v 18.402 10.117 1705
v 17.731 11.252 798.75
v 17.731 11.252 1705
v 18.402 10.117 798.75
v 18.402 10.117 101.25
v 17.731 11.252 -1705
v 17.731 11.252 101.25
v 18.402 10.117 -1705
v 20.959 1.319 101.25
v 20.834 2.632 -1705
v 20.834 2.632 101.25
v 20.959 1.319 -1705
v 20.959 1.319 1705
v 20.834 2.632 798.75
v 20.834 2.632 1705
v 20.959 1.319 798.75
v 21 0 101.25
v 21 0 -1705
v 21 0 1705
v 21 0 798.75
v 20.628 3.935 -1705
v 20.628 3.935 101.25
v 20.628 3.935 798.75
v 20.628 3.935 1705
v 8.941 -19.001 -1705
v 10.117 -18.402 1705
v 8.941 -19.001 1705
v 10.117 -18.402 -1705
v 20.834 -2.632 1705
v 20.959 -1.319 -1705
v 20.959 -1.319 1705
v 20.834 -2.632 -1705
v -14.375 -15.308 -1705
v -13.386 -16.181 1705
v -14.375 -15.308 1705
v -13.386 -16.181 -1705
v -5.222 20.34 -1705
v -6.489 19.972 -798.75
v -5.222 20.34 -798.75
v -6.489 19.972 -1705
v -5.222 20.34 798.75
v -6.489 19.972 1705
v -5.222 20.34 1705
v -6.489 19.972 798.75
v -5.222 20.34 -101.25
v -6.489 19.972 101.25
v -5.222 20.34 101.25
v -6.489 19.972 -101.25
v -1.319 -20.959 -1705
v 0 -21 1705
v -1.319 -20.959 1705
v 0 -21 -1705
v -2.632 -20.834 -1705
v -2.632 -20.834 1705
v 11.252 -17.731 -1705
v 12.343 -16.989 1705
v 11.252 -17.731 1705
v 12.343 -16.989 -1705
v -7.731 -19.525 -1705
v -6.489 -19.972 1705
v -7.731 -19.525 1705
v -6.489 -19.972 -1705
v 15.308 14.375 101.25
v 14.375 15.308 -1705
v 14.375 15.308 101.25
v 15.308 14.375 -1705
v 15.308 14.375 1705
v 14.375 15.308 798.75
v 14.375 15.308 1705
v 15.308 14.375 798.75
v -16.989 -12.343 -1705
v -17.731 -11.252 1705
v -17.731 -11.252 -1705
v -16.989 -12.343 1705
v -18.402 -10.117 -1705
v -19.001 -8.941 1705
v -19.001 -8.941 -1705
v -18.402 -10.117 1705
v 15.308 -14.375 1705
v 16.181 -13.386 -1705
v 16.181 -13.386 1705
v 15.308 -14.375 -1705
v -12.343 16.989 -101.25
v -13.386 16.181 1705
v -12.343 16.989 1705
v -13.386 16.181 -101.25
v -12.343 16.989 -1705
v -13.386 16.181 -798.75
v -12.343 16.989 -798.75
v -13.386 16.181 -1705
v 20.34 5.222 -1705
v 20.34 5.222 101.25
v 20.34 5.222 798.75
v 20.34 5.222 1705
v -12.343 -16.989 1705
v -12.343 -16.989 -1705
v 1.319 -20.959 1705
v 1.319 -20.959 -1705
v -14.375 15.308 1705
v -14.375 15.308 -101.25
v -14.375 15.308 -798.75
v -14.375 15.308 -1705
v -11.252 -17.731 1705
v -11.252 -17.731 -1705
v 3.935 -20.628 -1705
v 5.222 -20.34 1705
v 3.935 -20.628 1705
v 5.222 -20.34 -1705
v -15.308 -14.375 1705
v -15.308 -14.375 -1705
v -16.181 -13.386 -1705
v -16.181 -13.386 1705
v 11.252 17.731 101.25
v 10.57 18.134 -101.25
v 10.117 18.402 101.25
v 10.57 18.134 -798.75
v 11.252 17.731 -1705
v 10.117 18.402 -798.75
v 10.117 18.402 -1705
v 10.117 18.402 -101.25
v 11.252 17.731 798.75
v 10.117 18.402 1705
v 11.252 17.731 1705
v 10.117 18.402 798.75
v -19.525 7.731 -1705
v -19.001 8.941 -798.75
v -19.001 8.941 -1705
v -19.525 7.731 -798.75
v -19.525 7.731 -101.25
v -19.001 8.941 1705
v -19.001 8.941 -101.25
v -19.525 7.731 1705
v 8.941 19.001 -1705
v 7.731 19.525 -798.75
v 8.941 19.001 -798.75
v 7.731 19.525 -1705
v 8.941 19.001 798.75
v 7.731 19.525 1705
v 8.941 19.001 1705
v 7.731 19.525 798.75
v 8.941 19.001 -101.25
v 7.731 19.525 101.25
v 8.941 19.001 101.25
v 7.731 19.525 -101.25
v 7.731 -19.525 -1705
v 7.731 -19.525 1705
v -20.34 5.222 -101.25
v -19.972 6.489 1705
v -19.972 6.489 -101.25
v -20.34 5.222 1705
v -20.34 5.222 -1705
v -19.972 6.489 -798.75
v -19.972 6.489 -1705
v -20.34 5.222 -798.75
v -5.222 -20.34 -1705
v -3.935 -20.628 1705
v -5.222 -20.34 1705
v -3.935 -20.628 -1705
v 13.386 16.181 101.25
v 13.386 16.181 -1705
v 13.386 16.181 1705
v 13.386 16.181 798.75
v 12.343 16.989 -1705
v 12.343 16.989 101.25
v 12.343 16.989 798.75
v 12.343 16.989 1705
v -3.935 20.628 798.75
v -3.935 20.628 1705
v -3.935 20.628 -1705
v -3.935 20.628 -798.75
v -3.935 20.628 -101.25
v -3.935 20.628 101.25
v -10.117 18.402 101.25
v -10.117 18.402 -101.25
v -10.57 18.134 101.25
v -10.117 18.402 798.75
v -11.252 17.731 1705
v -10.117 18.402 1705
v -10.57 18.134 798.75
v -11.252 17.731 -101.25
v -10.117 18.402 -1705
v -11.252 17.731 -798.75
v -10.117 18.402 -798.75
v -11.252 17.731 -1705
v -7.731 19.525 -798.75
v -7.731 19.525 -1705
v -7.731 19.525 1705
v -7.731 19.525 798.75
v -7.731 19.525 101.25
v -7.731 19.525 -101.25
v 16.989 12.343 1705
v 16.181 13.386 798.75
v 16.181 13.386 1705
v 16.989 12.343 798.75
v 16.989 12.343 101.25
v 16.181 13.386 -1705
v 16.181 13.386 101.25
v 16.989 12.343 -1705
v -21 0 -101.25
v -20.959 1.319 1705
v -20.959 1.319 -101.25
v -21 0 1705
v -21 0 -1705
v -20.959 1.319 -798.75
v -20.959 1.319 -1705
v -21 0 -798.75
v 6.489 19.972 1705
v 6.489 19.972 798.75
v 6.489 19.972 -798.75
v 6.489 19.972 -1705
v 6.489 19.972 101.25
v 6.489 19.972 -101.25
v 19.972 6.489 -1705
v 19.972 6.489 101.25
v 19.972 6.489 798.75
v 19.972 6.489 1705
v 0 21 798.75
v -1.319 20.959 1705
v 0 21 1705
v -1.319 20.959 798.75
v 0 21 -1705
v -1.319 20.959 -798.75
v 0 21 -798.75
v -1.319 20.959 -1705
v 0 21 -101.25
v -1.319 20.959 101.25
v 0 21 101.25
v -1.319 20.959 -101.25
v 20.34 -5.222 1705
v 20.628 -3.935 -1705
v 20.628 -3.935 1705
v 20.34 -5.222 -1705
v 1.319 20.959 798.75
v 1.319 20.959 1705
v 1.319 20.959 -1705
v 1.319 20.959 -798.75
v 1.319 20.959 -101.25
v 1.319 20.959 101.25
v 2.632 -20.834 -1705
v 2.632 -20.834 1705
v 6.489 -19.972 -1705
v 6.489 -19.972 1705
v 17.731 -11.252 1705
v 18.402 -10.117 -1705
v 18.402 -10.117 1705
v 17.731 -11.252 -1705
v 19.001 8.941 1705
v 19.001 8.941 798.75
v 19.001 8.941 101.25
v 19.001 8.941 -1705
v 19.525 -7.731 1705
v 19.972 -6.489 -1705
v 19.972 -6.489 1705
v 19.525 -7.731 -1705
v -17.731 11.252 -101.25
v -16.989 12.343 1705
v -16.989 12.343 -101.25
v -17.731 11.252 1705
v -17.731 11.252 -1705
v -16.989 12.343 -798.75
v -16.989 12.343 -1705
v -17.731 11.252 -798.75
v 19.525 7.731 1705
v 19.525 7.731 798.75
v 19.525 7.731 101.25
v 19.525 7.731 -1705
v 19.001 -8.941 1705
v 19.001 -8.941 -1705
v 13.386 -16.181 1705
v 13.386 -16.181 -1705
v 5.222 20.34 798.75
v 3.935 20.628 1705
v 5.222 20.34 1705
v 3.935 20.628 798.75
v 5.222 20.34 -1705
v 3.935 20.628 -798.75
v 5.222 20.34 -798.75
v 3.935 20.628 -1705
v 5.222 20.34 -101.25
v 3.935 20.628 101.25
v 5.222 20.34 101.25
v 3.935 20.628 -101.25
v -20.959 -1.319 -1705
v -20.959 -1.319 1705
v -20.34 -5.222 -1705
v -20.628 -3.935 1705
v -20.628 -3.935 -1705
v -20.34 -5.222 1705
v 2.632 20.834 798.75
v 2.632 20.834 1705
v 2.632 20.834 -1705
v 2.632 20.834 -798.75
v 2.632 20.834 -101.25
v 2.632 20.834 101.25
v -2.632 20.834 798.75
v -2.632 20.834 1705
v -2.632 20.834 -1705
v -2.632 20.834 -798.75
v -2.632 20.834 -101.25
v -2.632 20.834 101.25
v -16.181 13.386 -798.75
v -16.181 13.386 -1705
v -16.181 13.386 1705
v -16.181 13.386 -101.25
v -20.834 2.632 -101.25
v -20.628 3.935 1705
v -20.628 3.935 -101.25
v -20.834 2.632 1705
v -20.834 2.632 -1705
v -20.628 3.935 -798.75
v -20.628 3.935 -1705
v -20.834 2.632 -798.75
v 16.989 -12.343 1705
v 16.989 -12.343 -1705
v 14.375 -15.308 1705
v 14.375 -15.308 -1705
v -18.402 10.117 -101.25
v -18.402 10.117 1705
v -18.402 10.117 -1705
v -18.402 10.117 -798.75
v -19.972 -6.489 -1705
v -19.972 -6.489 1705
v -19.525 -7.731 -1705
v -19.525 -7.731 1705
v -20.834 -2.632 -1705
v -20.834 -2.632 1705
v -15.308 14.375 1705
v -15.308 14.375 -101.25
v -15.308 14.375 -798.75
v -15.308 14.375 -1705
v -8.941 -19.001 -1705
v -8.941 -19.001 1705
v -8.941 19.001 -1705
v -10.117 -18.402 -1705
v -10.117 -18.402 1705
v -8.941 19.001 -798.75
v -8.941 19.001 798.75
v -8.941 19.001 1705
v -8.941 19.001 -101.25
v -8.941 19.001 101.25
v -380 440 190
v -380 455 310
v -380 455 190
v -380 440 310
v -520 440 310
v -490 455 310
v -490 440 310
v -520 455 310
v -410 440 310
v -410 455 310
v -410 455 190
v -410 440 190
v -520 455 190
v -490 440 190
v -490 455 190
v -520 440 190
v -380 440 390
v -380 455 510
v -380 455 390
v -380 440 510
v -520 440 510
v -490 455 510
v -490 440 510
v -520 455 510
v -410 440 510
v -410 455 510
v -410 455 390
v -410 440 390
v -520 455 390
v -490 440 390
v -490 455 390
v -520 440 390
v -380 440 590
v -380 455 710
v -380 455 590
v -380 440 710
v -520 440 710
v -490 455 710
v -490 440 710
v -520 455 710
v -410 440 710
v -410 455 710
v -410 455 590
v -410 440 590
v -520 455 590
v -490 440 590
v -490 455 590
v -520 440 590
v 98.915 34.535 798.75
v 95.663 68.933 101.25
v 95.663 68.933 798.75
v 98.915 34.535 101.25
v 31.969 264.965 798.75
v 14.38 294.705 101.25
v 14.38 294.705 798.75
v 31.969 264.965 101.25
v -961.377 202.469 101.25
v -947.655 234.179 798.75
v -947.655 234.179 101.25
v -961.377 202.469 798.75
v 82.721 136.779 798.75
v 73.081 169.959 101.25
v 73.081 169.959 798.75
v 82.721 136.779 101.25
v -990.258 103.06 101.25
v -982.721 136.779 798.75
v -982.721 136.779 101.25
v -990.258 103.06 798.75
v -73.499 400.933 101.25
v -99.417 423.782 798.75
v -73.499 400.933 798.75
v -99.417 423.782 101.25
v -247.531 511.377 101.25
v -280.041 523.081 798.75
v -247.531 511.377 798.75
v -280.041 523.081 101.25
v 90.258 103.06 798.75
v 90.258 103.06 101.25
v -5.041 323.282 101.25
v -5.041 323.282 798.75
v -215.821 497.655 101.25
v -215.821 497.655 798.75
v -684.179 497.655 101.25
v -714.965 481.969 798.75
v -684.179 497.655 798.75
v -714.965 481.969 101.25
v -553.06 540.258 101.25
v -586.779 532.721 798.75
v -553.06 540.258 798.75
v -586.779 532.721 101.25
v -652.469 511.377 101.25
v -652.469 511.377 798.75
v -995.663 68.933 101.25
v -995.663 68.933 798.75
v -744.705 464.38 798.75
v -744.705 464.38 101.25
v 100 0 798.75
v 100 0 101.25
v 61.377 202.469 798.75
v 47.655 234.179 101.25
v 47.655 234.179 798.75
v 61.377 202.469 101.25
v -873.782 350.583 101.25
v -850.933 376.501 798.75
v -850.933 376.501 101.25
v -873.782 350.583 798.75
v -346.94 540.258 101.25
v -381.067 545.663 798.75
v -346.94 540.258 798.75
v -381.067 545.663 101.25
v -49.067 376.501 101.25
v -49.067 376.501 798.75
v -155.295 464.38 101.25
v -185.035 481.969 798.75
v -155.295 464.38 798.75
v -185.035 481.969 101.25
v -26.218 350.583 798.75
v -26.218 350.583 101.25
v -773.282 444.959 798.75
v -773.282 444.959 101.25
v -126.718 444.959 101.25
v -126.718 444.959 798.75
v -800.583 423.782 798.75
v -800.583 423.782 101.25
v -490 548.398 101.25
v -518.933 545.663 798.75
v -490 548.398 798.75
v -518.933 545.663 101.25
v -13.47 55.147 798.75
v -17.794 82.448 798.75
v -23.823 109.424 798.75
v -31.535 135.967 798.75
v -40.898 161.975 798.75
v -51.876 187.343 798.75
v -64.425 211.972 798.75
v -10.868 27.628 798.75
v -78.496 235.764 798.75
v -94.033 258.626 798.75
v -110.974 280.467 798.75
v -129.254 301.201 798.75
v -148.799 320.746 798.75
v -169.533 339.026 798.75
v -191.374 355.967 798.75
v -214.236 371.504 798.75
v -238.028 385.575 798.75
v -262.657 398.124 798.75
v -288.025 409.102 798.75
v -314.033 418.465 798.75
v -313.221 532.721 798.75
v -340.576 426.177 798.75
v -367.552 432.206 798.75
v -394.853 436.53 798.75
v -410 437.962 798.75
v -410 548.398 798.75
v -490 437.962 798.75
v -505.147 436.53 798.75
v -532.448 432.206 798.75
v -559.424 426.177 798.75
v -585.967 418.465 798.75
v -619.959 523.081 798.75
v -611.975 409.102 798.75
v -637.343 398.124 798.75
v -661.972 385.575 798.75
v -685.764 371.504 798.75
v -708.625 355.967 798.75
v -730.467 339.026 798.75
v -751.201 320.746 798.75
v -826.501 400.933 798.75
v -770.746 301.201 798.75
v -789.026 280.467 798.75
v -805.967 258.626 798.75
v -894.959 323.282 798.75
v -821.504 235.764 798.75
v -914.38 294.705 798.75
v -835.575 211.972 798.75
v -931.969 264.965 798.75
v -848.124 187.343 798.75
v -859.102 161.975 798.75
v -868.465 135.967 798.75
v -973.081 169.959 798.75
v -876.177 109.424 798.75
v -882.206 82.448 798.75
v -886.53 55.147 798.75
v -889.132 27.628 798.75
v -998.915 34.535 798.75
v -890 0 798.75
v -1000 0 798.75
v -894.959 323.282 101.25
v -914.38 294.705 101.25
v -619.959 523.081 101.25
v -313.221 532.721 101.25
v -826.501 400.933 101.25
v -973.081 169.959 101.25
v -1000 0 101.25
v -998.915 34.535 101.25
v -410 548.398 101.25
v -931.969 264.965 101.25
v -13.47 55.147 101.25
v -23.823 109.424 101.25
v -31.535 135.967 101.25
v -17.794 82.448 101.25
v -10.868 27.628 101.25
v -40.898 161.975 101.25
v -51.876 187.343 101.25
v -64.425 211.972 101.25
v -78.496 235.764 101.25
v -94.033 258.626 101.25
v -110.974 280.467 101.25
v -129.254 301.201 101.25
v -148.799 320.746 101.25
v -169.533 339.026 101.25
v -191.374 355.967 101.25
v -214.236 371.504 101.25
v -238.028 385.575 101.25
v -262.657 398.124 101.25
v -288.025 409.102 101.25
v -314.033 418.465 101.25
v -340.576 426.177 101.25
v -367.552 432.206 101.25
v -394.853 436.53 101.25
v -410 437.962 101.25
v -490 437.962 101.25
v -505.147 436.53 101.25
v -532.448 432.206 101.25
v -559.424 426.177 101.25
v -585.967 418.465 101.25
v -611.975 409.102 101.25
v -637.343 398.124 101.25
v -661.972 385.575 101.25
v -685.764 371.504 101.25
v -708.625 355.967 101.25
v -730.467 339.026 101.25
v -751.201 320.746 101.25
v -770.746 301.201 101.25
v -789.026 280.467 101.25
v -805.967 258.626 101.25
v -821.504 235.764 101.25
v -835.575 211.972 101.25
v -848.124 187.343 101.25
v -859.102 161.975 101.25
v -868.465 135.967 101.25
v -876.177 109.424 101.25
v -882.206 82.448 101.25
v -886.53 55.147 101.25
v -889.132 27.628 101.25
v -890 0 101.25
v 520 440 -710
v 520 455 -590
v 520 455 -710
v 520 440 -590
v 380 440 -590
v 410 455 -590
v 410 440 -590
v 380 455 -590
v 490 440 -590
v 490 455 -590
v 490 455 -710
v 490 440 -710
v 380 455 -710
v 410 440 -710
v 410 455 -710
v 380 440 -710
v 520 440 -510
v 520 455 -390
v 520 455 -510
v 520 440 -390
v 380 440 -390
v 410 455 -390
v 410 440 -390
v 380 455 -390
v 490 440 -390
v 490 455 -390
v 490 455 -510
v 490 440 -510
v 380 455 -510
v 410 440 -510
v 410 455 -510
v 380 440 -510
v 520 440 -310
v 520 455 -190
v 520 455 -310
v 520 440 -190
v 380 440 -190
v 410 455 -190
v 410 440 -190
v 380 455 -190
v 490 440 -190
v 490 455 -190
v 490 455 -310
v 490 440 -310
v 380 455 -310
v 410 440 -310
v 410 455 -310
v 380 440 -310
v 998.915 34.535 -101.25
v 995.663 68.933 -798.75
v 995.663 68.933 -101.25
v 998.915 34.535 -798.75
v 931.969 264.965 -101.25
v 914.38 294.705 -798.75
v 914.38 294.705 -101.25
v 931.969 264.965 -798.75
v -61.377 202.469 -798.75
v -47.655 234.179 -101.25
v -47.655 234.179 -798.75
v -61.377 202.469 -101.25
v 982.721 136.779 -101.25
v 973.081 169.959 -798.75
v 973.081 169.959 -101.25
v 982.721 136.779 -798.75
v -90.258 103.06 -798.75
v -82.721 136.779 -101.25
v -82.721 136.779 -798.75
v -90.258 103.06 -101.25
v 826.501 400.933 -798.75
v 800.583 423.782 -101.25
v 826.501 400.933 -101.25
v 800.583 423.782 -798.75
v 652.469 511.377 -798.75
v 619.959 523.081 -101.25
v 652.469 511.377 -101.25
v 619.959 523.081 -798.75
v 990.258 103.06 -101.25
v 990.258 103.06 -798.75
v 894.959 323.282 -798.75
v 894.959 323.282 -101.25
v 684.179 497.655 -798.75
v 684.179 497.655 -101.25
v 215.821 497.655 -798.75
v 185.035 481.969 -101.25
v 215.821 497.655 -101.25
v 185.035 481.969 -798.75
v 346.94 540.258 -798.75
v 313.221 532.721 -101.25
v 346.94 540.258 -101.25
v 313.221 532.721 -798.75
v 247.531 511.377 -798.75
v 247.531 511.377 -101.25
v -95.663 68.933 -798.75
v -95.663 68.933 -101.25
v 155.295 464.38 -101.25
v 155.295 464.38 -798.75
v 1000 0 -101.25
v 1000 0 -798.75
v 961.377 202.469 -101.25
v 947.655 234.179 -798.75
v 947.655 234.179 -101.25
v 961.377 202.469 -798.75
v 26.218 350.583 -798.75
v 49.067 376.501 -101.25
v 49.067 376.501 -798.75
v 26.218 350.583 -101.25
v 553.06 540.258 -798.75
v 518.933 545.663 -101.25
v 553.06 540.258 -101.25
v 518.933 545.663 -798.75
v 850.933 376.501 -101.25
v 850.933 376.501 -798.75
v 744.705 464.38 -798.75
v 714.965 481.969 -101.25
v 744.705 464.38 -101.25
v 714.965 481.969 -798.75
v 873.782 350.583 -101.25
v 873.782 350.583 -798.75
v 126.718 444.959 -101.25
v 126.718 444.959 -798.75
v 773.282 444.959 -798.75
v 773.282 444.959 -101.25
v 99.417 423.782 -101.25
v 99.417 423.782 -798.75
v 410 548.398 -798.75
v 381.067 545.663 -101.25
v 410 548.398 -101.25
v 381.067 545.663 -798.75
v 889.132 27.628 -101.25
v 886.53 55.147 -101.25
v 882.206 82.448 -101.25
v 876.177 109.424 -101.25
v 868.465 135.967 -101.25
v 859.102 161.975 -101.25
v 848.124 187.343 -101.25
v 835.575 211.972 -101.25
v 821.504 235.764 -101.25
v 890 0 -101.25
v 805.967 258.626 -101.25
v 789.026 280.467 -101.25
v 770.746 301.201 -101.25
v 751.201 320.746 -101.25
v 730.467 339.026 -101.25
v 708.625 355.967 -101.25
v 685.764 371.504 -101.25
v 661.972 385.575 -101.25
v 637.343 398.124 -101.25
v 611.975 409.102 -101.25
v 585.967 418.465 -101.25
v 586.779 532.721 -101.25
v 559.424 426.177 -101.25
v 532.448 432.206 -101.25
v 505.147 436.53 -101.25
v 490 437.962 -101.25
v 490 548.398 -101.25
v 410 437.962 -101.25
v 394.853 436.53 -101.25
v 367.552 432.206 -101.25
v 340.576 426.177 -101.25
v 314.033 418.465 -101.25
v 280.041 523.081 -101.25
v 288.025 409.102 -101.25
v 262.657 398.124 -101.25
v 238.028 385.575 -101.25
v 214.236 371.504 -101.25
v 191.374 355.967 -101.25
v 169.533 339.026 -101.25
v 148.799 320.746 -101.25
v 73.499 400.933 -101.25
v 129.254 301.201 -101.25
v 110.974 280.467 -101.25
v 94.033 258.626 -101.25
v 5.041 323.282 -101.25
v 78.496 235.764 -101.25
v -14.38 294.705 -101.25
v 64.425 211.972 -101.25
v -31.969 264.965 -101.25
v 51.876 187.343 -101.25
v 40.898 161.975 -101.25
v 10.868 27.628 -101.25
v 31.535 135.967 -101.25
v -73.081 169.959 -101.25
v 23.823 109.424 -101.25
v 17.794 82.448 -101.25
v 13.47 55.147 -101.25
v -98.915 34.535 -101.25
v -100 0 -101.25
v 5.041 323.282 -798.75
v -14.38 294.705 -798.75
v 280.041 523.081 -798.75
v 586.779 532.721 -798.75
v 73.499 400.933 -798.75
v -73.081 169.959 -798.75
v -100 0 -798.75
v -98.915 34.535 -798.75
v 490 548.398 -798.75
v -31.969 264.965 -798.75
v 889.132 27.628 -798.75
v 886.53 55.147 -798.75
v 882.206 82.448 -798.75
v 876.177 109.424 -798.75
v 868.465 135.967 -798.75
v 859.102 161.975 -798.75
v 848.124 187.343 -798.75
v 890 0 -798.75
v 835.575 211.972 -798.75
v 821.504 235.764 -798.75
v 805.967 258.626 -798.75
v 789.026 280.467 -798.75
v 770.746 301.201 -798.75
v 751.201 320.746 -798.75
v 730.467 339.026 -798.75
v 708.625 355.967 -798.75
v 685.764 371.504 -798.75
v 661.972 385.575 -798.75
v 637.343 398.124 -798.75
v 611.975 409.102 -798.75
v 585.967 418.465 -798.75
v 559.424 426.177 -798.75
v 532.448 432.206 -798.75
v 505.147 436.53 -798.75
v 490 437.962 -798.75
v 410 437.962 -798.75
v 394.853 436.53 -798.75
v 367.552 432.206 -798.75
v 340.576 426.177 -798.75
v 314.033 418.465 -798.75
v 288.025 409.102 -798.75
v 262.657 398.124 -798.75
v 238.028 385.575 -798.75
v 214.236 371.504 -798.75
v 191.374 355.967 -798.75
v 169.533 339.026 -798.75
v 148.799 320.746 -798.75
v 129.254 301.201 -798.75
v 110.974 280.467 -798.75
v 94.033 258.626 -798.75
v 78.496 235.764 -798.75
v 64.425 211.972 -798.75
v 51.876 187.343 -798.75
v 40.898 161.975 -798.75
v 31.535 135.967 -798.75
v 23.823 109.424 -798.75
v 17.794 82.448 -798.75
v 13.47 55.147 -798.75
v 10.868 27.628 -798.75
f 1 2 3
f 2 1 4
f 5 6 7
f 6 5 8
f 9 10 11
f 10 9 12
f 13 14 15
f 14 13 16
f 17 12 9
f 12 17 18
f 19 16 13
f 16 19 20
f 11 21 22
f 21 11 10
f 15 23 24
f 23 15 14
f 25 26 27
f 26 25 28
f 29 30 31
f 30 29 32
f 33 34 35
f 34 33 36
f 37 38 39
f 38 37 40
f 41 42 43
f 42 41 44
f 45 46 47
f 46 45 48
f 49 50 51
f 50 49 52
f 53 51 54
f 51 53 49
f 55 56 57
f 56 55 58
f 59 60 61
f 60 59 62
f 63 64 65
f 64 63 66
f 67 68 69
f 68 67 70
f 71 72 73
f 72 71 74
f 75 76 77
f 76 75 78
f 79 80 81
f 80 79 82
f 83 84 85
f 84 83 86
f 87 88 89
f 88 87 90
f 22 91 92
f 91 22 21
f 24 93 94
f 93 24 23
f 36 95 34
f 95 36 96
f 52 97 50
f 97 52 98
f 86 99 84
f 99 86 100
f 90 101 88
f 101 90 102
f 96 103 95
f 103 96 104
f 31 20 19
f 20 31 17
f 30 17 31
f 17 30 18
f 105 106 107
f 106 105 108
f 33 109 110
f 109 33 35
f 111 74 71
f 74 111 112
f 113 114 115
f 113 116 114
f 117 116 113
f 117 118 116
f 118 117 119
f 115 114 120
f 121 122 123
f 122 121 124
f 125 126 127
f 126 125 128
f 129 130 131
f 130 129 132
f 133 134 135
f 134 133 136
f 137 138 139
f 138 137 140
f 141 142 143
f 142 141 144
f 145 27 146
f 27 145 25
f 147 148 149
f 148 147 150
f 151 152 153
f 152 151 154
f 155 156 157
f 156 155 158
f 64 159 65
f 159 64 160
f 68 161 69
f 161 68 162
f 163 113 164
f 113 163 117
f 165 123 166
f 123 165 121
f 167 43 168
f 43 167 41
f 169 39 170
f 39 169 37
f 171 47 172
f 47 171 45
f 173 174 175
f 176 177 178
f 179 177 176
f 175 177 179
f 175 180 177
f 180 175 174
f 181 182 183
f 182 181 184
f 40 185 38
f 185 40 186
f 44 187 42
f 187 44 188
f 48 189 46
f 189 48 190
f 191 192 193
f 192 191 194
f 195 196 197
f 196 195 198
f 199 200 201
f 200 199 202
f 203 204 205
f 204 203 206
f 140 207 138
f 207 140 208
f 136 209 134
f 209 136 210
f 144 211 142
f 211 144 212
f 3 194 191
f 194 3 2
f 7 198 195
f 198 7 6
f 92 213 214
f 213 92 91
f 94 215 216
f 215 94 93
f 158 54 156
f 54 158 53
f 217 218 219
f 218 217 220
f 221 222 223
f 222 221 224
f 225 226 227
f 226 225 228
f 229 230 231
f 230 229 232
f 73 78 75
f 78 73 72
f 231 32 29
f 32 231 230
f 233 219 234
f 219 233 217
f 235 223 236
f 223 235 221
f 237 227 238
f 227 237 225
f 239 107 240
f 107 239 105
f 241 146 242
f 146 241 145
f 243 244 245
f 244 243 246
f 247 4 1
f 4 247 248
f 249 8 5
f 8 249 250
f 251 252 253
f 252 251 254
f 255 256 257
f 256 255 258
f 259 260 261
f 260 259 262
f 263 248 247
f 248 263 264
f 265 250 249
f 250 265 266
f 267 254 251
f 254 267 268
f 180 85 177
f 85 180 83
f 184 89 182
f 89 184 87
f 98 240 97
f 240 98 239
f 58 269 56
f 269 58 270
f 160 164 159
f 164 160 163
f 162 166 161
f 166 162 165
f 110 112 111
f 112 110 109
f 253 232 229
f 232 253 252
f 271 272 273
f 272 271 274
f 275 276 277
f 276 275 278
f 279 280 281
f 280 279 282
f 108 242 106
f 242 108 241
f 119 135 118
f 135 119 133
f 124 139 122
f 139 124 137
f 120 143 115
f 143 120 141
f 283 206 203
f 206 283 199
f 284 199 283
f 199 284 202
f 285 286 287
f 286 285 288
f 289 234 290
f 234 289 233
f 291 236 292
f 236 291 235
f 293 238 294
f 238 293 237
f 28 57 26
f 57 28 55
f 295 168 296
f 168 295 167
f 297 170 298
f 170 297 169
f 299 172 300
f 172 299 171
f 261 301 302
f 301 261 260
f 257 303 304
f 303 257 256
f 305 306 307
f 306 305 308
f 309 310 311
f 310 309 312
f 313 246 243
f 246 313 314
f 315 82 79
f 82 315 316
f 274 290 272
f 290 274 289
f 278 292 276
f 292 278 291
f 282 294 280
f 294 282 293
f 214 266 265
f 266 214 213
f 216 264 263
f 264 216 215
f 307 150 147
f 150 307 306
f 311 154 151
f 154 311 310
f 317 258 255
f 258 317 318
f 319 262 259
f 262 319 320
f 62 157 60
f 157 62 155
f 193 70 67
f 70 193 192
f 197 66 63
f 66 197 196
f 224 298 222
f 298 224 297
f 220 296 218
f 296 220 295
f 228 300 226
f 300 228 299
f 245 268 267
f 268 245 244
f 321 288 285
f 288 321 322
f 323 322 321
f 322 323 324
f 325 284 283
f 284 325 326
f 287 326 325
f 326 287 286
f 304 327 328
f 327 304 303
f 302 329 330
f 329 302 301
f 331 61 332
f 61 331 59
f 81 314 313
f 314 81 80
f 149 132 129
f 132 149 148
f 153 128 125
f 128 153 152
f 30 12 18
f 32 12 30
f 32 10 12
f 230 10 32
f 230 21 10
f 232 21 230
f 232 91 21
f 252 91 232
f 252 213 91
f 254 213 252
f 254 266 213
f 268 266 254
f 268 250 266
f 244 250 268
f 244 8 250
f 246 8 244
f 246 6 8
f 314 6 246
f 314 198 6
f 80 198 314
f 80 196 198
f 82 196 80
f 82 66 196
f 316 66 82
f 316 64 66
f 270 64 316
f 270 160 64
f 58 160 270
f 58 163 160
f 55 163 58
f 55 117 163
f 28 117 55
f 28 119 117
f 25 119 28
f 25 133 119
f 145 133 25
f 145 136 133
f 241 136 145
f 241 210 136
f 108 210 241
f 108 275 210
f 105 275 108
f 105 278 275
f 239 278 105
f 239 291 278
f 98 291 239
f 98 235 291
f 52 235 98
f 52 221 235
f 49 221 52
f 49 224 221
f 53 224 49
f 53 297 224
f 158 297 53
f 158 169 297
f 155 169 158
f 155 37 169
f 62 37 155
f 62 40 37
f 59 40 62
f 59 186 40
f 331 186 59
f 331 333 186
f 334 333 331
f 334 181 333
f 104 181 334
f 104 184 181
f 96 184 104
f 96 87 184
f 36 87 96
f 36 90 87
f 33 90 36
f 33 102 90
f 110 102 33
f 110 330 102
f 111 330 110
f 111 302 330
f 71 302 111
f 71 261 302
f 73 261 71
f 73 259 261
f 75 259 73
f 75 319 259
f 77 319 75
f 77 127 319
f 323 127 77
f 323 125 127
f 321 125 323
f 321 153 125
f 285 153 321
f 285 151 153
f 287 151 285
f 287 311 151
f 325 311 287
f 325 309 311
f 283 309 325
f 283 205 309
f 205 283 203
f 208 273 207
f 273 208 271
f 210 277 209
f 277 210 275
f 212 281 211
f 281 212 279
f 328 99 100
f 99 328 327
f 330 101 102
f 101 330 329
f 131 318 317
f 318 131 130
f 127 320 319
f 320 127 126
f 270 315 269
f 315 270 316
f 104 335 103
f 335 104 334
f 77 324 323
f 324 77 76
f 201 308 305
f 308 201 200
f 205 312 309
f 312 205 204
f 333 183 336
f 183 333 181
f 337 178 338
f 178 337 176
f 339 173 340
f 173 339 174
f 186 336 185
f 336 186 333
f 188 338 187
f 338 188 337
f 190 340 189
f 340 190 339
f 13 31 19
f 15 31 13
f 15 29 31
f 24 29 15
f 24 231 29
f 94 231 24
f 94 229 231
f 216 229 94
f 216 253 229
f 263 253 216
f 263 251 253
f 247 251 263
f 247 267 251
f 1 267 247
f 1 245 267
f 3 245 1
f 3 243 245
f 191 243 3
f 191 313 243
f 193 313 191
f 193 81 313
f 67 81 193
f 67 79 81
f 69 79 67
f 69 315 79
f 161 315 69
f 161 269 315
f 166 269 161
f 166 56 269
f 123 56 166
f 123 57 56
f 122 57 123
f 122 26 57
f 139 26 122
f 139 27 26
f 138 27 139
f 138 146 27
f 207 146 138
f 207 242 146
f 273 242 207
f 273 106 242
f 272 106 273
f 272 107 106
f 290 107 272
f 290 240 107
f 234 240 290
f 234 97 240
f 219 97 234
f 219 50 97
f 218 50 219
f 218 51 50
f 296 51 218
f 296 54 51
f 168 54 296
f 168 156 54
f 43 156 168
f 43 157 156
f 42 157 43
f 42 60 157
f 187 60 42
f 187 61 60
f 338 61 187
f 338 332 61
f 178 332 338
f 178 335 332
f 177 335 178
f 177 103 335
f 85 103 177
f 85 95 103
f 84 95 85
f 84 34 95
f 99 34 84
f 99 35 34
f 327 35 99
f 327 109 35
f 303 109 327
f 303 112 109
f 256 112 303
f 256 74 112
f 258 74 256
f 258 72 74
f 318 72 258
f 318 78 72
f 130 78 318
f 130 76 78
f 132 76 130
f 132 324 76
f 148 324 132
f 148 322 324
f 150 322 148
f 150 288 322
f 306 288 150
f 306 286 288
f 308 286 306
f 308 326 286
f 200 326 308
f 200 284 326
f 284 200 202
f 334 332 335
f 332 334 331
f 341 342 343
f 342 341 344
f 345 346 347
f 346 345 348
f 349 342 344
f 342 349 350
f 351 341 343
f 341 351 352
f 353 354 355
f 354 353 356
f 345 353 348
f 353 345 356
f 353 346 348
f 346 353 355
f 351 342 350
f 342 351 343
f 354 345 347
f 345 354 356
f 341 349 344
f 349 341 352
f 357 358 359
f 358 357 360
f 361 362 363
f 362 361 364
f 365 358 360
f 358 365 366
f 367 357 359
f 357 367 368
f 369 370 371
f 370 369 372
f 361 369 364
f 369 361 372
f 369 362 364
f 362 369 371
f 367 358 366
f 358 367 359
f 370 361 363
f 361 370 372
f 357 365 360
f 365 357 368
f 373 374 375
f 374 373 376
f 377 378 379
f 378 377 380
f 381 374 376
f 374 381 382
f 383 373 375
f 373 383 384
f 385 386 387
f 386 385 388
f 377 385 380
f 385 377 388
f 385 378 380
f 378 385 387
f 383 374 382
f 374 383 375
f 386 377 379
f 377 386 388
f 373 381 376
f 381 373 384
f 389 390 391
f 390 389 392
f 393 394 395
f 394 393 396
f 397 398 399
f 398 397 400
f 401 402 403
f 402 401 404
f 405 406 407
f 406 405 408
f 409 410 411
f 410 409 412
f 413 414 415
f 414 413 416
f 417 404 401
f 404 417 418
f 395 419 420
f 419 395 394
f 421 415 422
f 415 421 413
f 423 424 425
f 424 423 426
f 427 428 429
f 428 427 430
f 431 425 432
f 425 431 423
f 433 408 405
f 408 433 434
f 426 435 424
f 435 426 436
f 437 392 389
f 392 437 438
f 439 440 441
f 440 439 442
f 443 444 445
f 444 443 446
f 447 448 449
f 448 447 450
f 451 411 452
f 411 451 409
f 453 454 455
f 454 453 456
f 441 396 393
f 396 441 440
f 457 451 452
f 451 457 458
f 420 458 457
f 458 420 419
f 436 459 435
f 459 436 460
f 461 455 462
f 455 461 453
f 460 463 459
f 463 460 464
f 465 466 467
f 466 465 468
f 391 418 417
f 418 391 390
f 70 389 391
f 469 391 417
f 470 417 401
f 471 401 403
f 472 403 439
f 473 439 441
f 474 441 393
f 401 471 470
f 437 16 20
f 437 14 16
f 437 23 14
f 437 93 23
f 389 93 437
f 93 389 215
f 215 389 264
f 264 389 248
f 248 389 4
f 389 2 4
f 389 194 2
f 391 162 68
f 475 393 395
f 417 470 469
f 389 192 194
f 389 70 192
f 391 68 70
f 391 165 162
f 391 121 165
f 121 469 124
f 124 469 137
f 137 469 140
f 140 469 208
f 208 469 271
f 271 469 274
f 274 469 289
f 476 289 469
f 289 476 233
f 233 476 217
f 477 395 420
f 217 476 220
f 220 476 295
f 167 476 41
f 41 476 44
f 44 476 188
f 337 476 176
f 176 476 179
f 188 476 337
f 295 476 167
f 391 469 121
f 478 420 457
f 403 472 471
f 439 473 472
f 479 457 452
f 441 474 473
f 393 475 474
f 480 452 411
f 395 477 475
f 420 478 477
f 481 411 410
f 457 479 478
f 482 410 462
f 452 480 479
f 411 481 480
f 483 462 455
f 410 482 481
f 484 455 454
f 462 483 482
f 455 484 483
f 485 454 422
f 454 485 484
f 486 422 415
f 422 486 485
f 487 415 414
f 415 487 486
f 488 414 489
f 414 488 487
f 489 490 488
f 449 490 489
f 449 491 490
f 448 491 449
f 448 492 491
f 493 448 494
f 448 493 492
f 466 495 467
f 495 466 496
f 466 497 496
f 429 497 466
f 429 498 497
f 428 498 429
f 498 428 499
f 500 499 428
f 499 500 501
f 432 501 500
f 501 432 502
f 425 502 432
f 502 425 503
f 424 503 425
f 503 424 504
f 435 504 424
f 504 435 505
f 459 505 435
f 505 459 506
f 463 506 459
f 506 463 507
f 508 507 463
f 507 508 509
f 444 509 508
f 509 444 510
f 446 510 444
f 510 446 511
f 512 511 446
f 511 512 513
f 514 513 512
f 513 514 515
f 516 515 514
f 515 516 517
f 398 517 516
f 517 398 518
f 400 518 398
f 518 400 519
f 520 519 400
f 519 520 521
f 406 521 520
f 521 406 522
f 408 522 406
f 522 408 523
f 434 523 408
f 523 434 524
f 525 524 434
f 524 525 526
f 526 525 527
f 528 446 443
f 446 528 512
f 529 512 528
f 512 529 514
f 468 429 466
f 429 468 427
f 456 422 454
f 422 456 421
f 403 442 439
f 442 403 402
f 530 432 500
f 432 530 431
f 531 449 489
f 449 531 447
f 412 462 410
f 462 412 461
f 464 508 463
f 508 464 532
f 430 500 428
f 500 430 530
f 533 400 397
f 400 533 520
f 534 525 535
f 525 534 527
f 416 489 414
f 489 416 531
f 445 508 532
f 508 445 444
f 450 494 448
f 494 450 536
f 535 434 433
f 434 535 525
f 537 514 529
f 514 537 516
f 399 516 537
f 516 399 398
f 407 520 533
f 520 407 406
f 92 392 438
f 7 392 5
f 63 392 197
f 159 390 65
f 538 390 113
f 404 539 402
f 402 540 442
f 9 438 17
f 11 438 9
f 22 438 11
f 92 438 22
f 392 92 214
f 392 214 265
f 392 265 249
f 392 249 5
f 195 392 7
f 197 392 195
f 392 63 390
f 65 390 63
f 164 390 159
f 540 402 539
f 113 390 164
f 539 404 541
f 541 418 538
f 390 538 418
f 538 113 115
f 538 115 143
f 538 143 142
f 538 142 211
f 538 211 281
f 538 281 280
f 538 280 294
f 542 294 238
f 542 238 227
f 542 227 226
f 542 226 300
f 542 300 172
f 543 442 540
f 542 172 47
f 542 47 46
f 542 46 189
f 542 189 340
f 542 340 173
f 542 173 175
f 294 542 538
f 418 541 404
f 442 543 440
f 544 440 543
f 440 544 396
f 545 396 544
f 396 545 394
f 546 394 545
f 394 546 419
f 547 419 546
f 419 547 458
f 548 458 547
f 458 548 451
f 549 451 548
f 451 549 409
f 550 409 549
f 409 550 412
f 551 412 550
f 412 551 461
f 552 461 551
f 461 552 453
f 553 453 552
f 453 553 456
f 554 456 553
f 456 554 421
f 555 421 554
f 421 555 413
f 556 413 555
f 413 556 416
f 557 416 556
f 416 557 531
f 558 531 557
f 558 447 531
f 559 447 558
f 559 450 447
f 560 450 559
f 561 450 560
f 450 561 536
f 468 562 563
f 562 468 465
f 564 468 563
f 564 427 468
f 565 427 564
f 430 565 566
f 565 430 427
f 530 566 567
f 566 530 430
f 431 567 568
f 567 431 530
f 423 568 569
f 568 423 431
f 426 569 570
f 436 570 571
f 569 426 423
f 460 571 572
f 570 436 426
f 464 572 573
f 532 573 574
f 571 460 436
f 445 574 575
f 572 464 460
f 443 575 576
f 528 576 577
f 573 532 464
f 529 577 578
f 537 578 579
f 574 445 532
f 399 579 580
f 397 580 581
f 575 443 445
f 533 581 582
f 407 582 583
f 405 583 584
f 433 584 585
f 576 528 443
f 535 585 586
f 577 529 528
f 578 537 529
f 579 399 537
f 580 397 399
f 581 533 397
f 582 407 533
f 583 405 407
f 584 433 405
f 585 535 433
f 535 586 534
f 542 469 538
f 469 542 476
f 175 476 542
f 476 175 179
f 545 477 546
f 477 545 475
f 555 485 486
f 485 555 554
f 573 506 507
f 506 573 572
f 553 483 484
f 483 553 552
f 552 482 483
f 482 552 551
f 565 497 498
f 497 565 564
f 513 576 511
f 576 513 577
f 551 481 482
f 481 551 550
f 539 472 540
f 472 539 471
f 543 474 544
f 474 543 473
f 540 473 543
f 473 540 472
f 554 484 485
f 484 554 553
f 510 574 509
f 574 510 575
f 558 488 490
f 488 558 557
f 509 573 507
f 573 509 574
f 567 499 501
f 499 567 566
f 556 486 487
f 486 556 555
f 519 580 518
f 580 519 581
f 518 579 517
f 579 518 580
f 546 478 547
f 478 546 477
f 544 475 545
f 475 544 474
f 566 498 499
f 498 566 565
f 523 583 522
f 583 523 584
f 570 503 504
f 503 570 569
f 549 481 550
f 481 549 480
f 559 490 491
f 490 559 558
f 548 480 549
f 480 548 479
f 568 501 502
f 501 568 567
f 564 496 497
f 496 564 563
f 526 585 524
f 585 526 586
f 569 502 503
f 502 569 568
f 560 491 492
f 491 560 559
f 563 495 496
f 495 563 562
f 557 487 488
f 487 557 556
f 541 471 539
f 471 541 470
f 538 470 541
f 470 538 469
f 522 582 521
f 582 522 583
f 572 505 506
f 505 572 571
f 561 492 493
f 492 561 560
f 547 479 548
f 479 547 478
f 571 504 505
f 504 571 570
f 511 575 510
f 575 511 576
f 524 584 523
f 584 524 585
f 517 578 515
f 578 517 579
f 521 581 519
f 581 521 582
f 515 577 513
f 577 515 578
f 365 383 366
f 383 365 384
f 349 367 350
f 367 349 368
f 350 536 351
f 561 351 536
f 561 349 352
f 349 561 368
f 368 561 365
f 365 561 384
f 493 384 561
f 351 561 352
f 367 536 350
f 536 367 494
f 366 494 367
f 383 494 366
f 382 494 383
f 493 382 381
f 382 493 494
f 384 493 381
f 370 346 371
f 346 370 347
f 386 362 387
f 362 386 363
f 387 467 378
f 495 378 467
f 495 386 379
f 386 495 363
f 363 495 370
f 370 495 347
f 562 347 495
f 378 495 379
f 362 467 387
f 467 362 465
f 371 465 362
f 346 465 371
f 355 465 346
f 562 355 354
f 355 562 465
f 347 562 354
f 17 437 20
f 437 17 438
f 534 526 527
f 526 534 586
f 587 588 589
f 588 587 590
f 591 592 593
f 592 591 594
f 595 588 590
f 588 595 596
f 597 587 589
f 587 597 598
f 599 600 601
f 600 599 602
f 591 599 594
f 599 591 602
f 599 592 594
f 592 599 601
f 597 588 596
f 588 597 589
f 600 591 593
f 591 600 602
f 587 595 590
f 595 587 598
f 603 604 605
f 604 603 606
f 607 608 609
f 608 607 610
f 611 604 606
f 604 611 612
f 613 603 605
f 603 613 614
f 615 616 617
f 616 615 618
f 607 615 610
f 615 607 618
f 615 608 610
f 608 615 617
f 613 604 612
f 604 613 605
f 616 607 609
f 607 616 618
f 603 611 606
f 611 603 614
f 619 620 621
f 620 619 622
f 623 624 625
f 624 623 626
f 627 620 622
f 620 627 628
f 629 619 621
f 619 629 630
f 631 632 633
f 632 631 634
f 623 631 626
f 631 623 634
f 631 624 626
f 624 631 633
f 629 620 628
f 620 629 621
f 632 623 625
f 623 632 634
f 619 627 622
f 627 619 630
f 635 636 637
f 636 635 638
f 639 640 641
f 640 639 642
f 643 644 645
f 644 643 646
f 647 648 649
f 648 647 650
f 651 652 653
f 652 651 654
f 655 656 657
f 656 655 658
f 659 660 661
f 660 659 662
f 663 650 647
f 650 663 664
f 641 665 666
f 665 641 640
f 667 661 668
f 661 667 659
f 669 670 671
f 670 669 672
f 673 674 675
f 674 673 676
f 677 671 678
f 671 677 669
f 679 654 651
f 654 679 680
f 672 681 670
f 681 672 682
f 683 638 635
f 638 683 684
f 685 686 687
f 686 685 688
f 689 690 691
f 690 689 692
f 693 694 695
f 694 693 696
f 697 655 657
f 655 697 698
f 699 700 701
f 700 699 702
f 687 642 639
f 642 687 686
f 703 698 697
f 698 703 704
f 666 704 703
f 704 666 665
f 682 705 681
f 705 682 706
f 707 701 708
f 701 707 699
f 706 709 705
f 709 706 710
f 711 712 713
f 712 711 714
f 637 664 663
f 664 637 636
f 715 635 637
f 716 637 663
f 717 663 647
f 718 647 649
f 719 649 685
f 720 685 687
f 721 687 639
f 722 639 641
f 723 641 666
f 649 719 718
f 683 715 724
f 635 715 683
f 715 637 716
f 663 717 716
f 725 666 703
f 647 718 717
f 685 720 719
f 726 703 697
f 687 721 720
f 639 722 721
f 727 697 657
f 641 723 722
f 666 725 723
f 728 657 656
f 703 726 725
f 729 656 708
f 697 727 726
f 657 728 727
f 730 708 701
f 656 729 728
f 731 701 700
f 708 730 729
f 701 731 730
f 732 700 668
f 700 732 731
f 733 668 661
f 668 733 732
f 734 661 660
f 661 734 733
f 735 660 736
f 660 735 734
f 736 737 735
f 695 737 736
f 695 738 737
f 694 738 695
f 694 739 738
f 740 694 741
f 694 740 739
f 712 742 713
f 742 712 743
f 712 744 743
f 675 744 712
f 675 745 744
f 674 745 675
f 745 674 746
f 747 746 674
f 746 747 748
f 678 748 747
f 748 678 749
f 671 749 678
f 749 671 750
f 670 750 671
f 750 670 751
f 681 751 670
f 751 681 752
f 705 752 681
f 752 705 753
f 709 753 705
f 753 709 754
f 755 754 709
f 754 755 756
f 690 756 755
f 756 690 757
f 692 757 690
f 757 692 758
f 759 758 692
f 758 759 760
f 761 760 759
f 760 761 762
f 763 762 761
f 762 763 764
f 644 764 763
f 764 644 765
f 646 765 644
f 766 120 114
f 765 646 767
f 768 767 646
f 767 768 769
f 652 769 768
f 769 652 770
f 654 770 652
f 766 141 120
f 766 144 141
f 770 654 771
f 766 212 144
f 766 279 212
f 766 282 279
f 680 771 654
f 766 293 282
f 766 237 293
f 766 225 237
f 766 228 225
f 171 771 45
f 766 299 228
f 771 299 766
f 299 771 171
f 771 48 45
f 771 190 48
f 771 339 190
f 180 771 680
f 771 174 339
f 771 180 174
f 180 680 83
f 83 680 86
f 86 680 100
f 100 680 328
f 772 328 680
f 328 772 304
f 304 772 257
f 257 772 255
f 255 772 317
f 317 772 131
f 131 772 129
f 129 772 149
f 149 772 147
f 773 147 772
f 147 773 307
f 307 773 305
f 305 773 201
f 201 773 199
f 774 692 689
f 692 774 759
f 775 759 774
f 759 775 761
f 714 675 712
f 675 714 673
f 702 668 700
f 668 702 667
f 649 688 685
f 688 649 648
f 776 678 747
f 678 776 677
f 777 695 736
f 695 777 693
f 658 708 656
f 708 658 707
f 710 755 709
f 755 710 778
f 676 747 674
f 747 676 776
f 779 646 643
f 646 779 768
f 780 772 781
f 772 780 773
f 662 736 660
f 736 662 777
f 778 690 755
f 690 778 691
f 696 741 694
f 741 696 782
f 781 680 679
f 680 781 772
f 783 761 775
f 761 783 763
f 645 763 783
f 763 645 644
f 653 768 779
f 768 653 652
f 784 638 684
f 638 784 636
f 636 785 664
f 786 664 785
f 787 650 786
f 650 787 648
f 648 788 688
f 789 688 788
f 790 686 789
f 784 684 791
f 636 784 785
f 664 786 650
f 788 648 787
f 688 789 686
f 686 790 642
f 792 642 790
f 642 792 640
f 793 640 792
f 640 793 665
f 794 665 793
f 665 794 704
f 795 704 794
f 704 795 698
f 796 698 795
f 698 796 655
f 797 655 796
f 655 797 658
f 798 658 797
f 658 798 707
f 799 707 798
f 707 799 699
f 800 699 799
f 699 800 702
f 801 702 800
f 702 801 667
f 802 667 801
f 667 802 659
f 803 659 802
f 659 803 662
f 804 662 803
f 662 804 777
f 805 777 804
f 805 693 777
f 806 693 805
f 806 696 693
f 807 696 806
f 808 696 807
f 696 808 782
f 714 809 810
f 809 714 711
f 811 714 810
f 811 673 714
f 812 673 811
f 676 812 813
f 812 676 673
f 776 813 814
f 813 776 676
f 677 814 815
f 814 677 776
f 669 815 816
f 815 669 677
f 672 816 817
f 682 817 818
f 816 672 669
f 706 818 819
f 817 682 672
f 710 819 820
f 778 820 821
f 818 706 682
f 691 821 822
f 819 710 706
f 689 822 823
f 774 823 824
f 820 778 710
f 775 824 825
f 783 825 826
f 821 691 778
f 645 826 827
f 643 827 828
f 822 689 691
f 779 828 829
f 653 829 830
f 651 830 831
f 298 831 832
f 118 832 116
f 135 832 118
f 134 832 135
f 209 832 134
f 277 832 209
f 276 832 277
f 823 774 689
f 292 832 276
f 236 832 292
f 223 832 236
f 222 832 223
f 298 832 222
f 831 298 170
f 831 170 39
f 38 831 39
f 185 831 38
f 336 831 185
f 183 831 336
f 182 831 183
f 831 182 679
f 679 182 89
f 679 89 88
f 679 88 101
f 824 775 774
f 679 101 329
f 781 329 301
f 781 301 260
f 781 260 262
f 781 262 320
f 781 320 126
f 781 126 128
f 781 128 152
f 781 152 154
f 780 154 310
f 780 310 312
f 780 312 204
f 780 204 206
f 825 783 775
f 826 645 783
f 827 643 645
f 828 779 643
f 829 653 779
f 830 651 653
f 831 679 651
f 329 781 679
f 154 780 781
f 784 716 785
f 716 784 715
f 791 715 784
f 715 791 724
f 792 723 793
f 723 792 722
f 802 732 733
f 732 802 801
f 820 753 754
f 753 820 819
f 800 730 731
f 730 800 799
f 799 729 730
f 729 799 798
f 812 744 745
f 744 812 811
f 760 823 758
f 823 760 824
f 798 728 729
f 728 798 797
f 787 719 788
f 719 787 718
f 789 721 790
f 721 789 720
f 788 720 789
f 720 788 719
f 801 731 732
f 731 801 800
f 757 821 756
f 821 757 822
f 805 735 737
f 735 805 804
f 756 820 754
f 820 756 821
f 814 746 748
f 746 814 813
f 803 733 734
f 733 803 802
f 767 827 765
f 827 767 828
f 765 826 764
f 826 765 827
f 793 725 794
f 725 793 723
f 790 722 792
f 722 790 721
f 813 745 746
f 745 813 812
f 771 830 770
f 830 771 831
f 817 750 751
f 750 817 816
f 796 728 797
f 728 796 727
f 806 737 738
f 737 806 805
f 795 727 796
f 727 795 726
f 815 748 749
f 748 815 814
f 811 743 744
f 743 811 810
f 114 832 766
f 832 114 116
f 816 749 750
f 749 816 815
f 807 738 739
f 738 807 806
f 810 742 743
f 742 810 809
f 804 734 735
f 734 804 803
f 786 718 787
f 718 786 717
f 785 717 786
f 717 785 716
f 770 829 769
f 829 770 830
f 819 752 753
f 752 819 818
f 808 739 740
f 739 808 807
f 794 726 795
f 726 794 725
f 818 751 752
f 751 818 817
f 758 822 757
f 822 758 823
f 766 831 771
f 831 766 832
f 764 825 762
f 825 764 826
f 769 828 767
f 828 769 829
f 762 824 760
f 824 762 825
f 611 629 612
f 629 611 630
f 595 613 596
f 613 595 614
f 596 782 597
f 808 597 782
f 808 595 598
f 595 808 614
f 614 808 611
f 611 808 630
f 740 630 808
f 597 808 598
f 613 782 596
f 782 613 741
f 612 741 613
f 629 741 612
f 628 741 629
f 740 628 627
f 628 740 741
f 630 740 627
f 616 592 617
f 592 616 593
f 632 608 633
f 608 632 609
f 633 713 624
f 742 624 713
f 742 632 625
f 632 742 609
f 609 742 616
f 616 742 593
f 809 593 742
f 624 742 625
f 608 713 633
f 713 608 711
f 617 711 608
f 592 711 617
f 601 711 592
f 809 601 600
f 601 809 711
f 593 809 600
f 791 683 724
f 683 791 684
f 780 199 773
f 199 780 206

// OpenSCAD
// ============================================================================
// PROJECT: XXXG-00W0 WING GUNDAM ZERO EW - THRUST REBALANCING MATRIX
// COMPONENT VAULT: BANDAI CAST RUNNER F - BACKPLATES F25 & F26
// PACKAGING RE-ARCHITECTURE: SUB-ARMOR CAPACITOR RECESSED BANK INTEGRATION
// CONFIG METRIC: SCALED TITANIUM CASTS (1:1 ACTUAL METRIC UP-SCALE)
// ============================================================================

$fn = 100; // Circular segment rendering resolution count

// Structural Constants Scaled 1:1 for a 16.7-Meter Airframe Scale (mm)
backplate_total_length = 1550;          // Total longitudinal vertical height (mm)
nozzle_clearance_diameter = 880;        // Clearance bore to fit over B21 exhaust (mm)
armor_skin_thickness = 50;              // Solid TiAl protective plating wall (mm)
harness_conduit_width = 80;             // Cast-in 4oz copper logic trace track (mm)
capacitor_pocket_depth = 15;            // Sub-armor recessed housing pocket depth (mm)
capacitor_pocket_width = 140;           // Transverse MLCC array pocket width (mm)

module Runner_F_Backplate_Forge() {
    // Central Supply Injection Runner Axis (Molten Feed Line from Siphon Forge)
    color([0.24, 0.24, 0.26]) {
        cylinder(h = backplate_total_length * 2.2, d = 42, center = true);
        // Direct injection gates tracking straight into the part mold cavities
        translate() rotate() cylinder(h = 450, d = 22);
        translate([0, 0, -450]) rotate() cylinder(h = 450, d = 22);
    }
    
    // Instantiate Scaled Skeutomorphic Part Molds Symmetrically (Left & Right)
    Cast_Outer_Backplate_Armor();
}

module Cast_Outer_Backplate_Armor() {
    // ---- PART F25: REAR LEFT PROTECTIVE BACKPLATE COWL SHIELD ---- [Page 18, Step 10-3]
    translate([-450, 0, 450]) color([0.7, 0.7, 0.75]) { // Standard Armor Grey Spec
        difference() {
            // Main solid heavy-duty rear upper hull shell block
            cylinder(h = backplate_total_length * 0.45, d = nozzle_clearance_diameter + (armor_skin_thickness * 2) + 120, center = true);
            
            // Central Internal Clearance Bore (Fits over B21 silent nozzle)
            cylinder(h = backplate_total_length * 0.5, d = nozzle_clearance_diameter, center = true);
            
            // SUB-ARMOR RECESSED CAPACITOR POCKETS [Segmented rows cut inside the armor inner wall]
            for (z_offset = [-200, 0, 200]) {
                translate([0, (nozzle_clearance_diameter/2 + capacitor_pocket_depth/2), z_offset])
                    cube([capacitor_pocket_width, capacitor_pocket_depth, 120], center = true);
            }
            
            // Continuous cast-in routing track for the 4oz solid-state wiring rails
            cube([harness_conduit_width, nozzle_clearance_diameter * 2, backplate_total_length], center = true);
            
            // Slicing profile tool to generate an asymmetrical half-shell part component
            translate([0, -nozzle_clearance_diameter, 0])
                cube([nozzle_clearance_diameter * 2, nozzle_clearance_diameter * 2, backplate_total_length * 2], center = true);
        }
    }
    
    // ---- PART F26: REAR RIGHT PROTECTIVE BACKPLATE COWL SHIELD ---- [Page 18, Step 10-3]
    translate([450, 0, -450]) rotate() color([0.7, 0.7, 0.75]) {
        difference() {
            cylinder(h = backplate_total_length * 0.45, d = nozzle_clearance_diameter + (armor_skin_thickness * 2) + 120, center = true);
            cylinder(h = backplate_total_length * 0.5, d = nozzle_clearance_diameter, center = true);
            
            for (z_offset = [-200, 0, 200]) {
                translate([0, (nozzle_clearance_diameter/2 + capacitor_pocket_depth/2), z_offset])
                    cube([capacitor_pocket_width, capacitor_pocket_depth, 120], center = true);
            }
            
            cube([harness_conduit_width, nozzle_clearance_diameter * 2, backplate_total_length], center = true);
            translate([0, -nozzle_clearance_diameter, 0])
                cube([nozzle_clearance_diameter * 2, nozzle_clearance_diameter * 2, backplate_total_length * 2], center = true);
        }
    }
}

// Render Master Assembly to Parameter Workspace
Runner_F_Backplate_Forge();
